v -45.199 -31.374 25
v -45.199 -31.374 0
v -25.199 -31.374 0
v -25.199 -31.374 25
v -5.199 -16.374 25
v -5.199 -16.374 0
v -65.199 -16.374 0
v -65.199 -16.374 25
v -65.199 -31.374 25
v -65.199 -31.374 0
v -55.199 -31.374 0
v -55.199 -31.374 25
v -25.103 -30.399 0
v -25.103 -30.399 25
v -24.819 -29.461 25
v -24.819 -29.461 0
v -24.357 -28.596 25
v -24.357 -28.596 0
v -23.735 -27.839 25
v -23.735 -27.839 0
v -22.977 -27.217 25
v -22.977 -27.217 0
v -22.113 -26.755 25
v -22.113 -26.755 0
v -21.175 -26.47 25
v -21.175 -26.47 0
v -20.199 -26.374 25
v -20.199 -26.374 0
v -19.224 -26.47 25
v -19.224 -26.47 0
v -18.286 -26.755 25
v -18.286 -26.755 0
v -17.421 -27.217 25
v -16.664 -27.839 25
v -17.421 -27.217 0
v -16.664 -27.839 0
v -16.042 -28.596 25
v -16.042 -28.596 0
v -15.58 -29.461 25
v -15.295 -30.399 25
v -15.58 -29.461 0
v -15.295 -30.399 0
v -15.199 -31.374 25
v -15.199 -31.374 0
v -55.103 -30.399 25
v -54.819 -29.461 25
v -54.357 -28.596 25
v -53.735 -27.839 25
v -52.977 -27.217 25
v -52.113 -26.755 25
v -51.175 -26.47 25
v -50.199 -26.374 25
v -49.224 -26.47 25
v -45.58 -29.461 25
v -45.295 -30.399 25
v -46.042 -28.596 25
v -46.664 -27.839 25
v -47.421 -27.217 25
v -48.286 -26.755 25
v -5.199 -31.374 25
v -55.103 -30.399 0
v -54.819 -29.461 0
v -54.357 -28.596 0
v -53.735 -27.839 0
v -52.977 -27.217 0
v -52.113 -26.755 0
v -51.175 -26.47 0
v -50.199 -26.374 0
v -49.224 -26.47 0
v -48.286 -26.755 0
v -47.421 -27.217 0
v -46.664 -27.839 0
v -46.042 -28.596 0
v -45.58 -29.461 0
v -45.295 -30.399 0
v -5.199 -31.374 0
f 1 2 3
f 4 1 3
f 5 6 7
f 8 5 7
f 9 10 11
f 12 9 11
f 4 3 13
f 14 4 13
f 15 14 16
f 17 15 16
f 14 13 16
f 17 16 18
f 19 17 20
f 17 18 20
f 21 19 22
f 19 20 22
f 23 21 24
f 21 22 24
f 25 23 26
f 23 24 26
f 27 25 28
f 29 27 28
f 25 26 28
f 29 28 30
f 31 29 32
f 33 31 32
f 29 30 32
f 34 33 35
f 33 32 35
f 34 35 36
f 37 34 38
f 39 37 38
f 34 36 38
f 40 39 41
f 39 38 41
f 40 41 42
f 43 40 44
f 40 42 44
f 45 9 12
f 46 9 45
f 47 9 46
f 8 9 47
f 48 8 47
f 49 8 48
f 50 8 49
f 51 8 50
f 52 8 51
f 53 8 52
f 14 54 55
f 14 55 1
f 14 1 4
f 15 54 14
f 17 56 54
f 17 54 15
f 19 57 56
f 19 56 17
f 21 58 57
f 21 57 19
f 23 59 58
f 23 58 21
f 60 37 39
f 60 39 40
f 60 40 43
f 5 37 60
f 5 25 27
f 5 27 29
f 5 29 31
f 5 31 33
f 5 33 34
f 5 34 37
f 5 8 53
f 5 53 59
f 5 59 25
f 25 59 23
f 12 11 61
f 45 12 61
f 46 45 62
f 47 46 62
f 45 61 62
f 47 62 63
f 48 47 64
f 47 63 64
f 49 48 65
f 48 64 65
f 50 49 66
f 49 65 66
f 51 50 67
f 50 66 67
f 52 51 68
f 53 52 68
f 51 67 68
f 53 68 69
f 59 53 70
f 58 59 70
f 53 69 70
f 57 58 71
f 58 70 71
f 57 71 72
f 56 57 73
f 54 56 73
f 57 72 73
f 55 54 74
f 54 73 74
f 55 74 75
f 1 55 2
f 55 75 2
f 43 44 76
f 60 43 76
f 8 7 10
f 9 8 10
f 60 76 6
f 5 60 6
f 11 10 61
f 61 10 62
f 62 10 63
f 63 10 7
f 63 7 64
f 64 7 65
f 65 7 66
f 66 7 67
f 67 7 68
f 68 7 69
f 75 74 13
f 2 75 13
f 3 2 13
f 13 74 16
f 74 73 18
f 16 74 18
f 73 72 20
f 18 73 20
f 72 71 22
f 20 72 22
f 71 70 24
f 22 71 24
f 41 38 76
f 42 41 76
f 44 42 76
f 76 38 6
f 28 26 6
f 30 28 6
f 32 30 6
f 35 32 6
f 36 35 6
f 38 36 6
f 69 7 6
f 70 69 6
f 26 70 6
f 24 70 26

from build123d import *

# Parameters (mm, degrees)
F1_DEPTH = 25


with BuildPart() as f1:
    # F0 (on Top) → F1 (new body)
    with BuildSketch(Plane.XY):
        with BuildLine():
            Line((-5.199284, -16.374299), (-65.199284, -16.374299))
            Line((-65.199284, -16.374299), (-65.199284, -31.374299))
            Line((-65.199284, -31.374299), (-55.199284, -31.374299))
            ThreePointArc((-55.199284, -31.374299), (-50.199284, -26.374299), (-45.199284, -31.374299))
            Line((-45.199284, -31.374299), (-25.199284, -31.374299))
            ThreePointArc((-25.199284, -31.374299), (-20.199284, -26.374299), (-15.199284, -31.374299))
            Line((-15.199284, -31.374299), (-5.199284, -31.374299))
            Line((-5.199284, -31.374299), (-5.199284, -16.374299))
        make_face()
    extrude(amount=F1_DEPTH)


solid = f1.part
